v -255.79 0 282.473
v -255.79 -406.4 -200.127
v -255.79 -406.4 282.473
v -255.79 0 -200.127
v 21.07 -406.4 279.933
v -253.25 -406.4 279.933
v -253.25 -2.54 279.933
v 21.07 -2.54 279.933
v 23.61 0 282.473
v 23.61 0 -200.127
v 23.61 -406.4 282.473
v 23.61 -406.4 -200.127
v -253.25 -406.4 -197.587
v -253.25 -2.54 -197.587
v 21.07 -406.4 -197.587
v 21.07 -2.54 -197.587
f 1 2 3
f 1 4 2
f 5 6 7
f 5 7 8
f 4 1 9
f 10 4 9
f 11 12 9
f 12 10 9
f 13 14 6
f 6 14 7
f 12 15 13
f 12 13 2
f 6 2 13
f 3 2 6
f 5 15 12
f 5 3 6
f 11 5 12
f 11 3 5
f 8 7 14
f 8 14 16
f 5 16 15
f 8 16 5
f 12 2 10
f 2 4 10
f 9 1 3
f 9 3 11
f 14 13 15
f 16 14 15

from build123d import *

# Parameters (mm, degrees)
F0_W     = 279.4
F0_H     = 482.6
F1_DEPTH = 25.4
F3_DEPTH = 381
F4_T     = -2.54


with BuildPart() as f1:
    # F0 (on Front) → F1 (new body)
    with BuildSketch(Plane.XZ):
        with Locations((-116.0904299468, 41.1734286772)):
            Rectangle(F0_W, F0_H)
    extrude(amount=F1_DEPTH)

    # F3 (add): a face of the model
    f3_faces = [f1.faces().sort_by_distance(p)[0] for p in [
        (-116.0904299468, -25.4, 41.1734286772),
    ]]
    extrude(f3_faces, amount=F3_DEPTH)

    # F4
    f4_openings = [f1.faces().sort_by_distance(p)[0] for p in [
        (-116.09043, -406.4, 41.173429),
    ]]
    offset(amount=F4_T, openings=f4_openings)


solid = f1.part
